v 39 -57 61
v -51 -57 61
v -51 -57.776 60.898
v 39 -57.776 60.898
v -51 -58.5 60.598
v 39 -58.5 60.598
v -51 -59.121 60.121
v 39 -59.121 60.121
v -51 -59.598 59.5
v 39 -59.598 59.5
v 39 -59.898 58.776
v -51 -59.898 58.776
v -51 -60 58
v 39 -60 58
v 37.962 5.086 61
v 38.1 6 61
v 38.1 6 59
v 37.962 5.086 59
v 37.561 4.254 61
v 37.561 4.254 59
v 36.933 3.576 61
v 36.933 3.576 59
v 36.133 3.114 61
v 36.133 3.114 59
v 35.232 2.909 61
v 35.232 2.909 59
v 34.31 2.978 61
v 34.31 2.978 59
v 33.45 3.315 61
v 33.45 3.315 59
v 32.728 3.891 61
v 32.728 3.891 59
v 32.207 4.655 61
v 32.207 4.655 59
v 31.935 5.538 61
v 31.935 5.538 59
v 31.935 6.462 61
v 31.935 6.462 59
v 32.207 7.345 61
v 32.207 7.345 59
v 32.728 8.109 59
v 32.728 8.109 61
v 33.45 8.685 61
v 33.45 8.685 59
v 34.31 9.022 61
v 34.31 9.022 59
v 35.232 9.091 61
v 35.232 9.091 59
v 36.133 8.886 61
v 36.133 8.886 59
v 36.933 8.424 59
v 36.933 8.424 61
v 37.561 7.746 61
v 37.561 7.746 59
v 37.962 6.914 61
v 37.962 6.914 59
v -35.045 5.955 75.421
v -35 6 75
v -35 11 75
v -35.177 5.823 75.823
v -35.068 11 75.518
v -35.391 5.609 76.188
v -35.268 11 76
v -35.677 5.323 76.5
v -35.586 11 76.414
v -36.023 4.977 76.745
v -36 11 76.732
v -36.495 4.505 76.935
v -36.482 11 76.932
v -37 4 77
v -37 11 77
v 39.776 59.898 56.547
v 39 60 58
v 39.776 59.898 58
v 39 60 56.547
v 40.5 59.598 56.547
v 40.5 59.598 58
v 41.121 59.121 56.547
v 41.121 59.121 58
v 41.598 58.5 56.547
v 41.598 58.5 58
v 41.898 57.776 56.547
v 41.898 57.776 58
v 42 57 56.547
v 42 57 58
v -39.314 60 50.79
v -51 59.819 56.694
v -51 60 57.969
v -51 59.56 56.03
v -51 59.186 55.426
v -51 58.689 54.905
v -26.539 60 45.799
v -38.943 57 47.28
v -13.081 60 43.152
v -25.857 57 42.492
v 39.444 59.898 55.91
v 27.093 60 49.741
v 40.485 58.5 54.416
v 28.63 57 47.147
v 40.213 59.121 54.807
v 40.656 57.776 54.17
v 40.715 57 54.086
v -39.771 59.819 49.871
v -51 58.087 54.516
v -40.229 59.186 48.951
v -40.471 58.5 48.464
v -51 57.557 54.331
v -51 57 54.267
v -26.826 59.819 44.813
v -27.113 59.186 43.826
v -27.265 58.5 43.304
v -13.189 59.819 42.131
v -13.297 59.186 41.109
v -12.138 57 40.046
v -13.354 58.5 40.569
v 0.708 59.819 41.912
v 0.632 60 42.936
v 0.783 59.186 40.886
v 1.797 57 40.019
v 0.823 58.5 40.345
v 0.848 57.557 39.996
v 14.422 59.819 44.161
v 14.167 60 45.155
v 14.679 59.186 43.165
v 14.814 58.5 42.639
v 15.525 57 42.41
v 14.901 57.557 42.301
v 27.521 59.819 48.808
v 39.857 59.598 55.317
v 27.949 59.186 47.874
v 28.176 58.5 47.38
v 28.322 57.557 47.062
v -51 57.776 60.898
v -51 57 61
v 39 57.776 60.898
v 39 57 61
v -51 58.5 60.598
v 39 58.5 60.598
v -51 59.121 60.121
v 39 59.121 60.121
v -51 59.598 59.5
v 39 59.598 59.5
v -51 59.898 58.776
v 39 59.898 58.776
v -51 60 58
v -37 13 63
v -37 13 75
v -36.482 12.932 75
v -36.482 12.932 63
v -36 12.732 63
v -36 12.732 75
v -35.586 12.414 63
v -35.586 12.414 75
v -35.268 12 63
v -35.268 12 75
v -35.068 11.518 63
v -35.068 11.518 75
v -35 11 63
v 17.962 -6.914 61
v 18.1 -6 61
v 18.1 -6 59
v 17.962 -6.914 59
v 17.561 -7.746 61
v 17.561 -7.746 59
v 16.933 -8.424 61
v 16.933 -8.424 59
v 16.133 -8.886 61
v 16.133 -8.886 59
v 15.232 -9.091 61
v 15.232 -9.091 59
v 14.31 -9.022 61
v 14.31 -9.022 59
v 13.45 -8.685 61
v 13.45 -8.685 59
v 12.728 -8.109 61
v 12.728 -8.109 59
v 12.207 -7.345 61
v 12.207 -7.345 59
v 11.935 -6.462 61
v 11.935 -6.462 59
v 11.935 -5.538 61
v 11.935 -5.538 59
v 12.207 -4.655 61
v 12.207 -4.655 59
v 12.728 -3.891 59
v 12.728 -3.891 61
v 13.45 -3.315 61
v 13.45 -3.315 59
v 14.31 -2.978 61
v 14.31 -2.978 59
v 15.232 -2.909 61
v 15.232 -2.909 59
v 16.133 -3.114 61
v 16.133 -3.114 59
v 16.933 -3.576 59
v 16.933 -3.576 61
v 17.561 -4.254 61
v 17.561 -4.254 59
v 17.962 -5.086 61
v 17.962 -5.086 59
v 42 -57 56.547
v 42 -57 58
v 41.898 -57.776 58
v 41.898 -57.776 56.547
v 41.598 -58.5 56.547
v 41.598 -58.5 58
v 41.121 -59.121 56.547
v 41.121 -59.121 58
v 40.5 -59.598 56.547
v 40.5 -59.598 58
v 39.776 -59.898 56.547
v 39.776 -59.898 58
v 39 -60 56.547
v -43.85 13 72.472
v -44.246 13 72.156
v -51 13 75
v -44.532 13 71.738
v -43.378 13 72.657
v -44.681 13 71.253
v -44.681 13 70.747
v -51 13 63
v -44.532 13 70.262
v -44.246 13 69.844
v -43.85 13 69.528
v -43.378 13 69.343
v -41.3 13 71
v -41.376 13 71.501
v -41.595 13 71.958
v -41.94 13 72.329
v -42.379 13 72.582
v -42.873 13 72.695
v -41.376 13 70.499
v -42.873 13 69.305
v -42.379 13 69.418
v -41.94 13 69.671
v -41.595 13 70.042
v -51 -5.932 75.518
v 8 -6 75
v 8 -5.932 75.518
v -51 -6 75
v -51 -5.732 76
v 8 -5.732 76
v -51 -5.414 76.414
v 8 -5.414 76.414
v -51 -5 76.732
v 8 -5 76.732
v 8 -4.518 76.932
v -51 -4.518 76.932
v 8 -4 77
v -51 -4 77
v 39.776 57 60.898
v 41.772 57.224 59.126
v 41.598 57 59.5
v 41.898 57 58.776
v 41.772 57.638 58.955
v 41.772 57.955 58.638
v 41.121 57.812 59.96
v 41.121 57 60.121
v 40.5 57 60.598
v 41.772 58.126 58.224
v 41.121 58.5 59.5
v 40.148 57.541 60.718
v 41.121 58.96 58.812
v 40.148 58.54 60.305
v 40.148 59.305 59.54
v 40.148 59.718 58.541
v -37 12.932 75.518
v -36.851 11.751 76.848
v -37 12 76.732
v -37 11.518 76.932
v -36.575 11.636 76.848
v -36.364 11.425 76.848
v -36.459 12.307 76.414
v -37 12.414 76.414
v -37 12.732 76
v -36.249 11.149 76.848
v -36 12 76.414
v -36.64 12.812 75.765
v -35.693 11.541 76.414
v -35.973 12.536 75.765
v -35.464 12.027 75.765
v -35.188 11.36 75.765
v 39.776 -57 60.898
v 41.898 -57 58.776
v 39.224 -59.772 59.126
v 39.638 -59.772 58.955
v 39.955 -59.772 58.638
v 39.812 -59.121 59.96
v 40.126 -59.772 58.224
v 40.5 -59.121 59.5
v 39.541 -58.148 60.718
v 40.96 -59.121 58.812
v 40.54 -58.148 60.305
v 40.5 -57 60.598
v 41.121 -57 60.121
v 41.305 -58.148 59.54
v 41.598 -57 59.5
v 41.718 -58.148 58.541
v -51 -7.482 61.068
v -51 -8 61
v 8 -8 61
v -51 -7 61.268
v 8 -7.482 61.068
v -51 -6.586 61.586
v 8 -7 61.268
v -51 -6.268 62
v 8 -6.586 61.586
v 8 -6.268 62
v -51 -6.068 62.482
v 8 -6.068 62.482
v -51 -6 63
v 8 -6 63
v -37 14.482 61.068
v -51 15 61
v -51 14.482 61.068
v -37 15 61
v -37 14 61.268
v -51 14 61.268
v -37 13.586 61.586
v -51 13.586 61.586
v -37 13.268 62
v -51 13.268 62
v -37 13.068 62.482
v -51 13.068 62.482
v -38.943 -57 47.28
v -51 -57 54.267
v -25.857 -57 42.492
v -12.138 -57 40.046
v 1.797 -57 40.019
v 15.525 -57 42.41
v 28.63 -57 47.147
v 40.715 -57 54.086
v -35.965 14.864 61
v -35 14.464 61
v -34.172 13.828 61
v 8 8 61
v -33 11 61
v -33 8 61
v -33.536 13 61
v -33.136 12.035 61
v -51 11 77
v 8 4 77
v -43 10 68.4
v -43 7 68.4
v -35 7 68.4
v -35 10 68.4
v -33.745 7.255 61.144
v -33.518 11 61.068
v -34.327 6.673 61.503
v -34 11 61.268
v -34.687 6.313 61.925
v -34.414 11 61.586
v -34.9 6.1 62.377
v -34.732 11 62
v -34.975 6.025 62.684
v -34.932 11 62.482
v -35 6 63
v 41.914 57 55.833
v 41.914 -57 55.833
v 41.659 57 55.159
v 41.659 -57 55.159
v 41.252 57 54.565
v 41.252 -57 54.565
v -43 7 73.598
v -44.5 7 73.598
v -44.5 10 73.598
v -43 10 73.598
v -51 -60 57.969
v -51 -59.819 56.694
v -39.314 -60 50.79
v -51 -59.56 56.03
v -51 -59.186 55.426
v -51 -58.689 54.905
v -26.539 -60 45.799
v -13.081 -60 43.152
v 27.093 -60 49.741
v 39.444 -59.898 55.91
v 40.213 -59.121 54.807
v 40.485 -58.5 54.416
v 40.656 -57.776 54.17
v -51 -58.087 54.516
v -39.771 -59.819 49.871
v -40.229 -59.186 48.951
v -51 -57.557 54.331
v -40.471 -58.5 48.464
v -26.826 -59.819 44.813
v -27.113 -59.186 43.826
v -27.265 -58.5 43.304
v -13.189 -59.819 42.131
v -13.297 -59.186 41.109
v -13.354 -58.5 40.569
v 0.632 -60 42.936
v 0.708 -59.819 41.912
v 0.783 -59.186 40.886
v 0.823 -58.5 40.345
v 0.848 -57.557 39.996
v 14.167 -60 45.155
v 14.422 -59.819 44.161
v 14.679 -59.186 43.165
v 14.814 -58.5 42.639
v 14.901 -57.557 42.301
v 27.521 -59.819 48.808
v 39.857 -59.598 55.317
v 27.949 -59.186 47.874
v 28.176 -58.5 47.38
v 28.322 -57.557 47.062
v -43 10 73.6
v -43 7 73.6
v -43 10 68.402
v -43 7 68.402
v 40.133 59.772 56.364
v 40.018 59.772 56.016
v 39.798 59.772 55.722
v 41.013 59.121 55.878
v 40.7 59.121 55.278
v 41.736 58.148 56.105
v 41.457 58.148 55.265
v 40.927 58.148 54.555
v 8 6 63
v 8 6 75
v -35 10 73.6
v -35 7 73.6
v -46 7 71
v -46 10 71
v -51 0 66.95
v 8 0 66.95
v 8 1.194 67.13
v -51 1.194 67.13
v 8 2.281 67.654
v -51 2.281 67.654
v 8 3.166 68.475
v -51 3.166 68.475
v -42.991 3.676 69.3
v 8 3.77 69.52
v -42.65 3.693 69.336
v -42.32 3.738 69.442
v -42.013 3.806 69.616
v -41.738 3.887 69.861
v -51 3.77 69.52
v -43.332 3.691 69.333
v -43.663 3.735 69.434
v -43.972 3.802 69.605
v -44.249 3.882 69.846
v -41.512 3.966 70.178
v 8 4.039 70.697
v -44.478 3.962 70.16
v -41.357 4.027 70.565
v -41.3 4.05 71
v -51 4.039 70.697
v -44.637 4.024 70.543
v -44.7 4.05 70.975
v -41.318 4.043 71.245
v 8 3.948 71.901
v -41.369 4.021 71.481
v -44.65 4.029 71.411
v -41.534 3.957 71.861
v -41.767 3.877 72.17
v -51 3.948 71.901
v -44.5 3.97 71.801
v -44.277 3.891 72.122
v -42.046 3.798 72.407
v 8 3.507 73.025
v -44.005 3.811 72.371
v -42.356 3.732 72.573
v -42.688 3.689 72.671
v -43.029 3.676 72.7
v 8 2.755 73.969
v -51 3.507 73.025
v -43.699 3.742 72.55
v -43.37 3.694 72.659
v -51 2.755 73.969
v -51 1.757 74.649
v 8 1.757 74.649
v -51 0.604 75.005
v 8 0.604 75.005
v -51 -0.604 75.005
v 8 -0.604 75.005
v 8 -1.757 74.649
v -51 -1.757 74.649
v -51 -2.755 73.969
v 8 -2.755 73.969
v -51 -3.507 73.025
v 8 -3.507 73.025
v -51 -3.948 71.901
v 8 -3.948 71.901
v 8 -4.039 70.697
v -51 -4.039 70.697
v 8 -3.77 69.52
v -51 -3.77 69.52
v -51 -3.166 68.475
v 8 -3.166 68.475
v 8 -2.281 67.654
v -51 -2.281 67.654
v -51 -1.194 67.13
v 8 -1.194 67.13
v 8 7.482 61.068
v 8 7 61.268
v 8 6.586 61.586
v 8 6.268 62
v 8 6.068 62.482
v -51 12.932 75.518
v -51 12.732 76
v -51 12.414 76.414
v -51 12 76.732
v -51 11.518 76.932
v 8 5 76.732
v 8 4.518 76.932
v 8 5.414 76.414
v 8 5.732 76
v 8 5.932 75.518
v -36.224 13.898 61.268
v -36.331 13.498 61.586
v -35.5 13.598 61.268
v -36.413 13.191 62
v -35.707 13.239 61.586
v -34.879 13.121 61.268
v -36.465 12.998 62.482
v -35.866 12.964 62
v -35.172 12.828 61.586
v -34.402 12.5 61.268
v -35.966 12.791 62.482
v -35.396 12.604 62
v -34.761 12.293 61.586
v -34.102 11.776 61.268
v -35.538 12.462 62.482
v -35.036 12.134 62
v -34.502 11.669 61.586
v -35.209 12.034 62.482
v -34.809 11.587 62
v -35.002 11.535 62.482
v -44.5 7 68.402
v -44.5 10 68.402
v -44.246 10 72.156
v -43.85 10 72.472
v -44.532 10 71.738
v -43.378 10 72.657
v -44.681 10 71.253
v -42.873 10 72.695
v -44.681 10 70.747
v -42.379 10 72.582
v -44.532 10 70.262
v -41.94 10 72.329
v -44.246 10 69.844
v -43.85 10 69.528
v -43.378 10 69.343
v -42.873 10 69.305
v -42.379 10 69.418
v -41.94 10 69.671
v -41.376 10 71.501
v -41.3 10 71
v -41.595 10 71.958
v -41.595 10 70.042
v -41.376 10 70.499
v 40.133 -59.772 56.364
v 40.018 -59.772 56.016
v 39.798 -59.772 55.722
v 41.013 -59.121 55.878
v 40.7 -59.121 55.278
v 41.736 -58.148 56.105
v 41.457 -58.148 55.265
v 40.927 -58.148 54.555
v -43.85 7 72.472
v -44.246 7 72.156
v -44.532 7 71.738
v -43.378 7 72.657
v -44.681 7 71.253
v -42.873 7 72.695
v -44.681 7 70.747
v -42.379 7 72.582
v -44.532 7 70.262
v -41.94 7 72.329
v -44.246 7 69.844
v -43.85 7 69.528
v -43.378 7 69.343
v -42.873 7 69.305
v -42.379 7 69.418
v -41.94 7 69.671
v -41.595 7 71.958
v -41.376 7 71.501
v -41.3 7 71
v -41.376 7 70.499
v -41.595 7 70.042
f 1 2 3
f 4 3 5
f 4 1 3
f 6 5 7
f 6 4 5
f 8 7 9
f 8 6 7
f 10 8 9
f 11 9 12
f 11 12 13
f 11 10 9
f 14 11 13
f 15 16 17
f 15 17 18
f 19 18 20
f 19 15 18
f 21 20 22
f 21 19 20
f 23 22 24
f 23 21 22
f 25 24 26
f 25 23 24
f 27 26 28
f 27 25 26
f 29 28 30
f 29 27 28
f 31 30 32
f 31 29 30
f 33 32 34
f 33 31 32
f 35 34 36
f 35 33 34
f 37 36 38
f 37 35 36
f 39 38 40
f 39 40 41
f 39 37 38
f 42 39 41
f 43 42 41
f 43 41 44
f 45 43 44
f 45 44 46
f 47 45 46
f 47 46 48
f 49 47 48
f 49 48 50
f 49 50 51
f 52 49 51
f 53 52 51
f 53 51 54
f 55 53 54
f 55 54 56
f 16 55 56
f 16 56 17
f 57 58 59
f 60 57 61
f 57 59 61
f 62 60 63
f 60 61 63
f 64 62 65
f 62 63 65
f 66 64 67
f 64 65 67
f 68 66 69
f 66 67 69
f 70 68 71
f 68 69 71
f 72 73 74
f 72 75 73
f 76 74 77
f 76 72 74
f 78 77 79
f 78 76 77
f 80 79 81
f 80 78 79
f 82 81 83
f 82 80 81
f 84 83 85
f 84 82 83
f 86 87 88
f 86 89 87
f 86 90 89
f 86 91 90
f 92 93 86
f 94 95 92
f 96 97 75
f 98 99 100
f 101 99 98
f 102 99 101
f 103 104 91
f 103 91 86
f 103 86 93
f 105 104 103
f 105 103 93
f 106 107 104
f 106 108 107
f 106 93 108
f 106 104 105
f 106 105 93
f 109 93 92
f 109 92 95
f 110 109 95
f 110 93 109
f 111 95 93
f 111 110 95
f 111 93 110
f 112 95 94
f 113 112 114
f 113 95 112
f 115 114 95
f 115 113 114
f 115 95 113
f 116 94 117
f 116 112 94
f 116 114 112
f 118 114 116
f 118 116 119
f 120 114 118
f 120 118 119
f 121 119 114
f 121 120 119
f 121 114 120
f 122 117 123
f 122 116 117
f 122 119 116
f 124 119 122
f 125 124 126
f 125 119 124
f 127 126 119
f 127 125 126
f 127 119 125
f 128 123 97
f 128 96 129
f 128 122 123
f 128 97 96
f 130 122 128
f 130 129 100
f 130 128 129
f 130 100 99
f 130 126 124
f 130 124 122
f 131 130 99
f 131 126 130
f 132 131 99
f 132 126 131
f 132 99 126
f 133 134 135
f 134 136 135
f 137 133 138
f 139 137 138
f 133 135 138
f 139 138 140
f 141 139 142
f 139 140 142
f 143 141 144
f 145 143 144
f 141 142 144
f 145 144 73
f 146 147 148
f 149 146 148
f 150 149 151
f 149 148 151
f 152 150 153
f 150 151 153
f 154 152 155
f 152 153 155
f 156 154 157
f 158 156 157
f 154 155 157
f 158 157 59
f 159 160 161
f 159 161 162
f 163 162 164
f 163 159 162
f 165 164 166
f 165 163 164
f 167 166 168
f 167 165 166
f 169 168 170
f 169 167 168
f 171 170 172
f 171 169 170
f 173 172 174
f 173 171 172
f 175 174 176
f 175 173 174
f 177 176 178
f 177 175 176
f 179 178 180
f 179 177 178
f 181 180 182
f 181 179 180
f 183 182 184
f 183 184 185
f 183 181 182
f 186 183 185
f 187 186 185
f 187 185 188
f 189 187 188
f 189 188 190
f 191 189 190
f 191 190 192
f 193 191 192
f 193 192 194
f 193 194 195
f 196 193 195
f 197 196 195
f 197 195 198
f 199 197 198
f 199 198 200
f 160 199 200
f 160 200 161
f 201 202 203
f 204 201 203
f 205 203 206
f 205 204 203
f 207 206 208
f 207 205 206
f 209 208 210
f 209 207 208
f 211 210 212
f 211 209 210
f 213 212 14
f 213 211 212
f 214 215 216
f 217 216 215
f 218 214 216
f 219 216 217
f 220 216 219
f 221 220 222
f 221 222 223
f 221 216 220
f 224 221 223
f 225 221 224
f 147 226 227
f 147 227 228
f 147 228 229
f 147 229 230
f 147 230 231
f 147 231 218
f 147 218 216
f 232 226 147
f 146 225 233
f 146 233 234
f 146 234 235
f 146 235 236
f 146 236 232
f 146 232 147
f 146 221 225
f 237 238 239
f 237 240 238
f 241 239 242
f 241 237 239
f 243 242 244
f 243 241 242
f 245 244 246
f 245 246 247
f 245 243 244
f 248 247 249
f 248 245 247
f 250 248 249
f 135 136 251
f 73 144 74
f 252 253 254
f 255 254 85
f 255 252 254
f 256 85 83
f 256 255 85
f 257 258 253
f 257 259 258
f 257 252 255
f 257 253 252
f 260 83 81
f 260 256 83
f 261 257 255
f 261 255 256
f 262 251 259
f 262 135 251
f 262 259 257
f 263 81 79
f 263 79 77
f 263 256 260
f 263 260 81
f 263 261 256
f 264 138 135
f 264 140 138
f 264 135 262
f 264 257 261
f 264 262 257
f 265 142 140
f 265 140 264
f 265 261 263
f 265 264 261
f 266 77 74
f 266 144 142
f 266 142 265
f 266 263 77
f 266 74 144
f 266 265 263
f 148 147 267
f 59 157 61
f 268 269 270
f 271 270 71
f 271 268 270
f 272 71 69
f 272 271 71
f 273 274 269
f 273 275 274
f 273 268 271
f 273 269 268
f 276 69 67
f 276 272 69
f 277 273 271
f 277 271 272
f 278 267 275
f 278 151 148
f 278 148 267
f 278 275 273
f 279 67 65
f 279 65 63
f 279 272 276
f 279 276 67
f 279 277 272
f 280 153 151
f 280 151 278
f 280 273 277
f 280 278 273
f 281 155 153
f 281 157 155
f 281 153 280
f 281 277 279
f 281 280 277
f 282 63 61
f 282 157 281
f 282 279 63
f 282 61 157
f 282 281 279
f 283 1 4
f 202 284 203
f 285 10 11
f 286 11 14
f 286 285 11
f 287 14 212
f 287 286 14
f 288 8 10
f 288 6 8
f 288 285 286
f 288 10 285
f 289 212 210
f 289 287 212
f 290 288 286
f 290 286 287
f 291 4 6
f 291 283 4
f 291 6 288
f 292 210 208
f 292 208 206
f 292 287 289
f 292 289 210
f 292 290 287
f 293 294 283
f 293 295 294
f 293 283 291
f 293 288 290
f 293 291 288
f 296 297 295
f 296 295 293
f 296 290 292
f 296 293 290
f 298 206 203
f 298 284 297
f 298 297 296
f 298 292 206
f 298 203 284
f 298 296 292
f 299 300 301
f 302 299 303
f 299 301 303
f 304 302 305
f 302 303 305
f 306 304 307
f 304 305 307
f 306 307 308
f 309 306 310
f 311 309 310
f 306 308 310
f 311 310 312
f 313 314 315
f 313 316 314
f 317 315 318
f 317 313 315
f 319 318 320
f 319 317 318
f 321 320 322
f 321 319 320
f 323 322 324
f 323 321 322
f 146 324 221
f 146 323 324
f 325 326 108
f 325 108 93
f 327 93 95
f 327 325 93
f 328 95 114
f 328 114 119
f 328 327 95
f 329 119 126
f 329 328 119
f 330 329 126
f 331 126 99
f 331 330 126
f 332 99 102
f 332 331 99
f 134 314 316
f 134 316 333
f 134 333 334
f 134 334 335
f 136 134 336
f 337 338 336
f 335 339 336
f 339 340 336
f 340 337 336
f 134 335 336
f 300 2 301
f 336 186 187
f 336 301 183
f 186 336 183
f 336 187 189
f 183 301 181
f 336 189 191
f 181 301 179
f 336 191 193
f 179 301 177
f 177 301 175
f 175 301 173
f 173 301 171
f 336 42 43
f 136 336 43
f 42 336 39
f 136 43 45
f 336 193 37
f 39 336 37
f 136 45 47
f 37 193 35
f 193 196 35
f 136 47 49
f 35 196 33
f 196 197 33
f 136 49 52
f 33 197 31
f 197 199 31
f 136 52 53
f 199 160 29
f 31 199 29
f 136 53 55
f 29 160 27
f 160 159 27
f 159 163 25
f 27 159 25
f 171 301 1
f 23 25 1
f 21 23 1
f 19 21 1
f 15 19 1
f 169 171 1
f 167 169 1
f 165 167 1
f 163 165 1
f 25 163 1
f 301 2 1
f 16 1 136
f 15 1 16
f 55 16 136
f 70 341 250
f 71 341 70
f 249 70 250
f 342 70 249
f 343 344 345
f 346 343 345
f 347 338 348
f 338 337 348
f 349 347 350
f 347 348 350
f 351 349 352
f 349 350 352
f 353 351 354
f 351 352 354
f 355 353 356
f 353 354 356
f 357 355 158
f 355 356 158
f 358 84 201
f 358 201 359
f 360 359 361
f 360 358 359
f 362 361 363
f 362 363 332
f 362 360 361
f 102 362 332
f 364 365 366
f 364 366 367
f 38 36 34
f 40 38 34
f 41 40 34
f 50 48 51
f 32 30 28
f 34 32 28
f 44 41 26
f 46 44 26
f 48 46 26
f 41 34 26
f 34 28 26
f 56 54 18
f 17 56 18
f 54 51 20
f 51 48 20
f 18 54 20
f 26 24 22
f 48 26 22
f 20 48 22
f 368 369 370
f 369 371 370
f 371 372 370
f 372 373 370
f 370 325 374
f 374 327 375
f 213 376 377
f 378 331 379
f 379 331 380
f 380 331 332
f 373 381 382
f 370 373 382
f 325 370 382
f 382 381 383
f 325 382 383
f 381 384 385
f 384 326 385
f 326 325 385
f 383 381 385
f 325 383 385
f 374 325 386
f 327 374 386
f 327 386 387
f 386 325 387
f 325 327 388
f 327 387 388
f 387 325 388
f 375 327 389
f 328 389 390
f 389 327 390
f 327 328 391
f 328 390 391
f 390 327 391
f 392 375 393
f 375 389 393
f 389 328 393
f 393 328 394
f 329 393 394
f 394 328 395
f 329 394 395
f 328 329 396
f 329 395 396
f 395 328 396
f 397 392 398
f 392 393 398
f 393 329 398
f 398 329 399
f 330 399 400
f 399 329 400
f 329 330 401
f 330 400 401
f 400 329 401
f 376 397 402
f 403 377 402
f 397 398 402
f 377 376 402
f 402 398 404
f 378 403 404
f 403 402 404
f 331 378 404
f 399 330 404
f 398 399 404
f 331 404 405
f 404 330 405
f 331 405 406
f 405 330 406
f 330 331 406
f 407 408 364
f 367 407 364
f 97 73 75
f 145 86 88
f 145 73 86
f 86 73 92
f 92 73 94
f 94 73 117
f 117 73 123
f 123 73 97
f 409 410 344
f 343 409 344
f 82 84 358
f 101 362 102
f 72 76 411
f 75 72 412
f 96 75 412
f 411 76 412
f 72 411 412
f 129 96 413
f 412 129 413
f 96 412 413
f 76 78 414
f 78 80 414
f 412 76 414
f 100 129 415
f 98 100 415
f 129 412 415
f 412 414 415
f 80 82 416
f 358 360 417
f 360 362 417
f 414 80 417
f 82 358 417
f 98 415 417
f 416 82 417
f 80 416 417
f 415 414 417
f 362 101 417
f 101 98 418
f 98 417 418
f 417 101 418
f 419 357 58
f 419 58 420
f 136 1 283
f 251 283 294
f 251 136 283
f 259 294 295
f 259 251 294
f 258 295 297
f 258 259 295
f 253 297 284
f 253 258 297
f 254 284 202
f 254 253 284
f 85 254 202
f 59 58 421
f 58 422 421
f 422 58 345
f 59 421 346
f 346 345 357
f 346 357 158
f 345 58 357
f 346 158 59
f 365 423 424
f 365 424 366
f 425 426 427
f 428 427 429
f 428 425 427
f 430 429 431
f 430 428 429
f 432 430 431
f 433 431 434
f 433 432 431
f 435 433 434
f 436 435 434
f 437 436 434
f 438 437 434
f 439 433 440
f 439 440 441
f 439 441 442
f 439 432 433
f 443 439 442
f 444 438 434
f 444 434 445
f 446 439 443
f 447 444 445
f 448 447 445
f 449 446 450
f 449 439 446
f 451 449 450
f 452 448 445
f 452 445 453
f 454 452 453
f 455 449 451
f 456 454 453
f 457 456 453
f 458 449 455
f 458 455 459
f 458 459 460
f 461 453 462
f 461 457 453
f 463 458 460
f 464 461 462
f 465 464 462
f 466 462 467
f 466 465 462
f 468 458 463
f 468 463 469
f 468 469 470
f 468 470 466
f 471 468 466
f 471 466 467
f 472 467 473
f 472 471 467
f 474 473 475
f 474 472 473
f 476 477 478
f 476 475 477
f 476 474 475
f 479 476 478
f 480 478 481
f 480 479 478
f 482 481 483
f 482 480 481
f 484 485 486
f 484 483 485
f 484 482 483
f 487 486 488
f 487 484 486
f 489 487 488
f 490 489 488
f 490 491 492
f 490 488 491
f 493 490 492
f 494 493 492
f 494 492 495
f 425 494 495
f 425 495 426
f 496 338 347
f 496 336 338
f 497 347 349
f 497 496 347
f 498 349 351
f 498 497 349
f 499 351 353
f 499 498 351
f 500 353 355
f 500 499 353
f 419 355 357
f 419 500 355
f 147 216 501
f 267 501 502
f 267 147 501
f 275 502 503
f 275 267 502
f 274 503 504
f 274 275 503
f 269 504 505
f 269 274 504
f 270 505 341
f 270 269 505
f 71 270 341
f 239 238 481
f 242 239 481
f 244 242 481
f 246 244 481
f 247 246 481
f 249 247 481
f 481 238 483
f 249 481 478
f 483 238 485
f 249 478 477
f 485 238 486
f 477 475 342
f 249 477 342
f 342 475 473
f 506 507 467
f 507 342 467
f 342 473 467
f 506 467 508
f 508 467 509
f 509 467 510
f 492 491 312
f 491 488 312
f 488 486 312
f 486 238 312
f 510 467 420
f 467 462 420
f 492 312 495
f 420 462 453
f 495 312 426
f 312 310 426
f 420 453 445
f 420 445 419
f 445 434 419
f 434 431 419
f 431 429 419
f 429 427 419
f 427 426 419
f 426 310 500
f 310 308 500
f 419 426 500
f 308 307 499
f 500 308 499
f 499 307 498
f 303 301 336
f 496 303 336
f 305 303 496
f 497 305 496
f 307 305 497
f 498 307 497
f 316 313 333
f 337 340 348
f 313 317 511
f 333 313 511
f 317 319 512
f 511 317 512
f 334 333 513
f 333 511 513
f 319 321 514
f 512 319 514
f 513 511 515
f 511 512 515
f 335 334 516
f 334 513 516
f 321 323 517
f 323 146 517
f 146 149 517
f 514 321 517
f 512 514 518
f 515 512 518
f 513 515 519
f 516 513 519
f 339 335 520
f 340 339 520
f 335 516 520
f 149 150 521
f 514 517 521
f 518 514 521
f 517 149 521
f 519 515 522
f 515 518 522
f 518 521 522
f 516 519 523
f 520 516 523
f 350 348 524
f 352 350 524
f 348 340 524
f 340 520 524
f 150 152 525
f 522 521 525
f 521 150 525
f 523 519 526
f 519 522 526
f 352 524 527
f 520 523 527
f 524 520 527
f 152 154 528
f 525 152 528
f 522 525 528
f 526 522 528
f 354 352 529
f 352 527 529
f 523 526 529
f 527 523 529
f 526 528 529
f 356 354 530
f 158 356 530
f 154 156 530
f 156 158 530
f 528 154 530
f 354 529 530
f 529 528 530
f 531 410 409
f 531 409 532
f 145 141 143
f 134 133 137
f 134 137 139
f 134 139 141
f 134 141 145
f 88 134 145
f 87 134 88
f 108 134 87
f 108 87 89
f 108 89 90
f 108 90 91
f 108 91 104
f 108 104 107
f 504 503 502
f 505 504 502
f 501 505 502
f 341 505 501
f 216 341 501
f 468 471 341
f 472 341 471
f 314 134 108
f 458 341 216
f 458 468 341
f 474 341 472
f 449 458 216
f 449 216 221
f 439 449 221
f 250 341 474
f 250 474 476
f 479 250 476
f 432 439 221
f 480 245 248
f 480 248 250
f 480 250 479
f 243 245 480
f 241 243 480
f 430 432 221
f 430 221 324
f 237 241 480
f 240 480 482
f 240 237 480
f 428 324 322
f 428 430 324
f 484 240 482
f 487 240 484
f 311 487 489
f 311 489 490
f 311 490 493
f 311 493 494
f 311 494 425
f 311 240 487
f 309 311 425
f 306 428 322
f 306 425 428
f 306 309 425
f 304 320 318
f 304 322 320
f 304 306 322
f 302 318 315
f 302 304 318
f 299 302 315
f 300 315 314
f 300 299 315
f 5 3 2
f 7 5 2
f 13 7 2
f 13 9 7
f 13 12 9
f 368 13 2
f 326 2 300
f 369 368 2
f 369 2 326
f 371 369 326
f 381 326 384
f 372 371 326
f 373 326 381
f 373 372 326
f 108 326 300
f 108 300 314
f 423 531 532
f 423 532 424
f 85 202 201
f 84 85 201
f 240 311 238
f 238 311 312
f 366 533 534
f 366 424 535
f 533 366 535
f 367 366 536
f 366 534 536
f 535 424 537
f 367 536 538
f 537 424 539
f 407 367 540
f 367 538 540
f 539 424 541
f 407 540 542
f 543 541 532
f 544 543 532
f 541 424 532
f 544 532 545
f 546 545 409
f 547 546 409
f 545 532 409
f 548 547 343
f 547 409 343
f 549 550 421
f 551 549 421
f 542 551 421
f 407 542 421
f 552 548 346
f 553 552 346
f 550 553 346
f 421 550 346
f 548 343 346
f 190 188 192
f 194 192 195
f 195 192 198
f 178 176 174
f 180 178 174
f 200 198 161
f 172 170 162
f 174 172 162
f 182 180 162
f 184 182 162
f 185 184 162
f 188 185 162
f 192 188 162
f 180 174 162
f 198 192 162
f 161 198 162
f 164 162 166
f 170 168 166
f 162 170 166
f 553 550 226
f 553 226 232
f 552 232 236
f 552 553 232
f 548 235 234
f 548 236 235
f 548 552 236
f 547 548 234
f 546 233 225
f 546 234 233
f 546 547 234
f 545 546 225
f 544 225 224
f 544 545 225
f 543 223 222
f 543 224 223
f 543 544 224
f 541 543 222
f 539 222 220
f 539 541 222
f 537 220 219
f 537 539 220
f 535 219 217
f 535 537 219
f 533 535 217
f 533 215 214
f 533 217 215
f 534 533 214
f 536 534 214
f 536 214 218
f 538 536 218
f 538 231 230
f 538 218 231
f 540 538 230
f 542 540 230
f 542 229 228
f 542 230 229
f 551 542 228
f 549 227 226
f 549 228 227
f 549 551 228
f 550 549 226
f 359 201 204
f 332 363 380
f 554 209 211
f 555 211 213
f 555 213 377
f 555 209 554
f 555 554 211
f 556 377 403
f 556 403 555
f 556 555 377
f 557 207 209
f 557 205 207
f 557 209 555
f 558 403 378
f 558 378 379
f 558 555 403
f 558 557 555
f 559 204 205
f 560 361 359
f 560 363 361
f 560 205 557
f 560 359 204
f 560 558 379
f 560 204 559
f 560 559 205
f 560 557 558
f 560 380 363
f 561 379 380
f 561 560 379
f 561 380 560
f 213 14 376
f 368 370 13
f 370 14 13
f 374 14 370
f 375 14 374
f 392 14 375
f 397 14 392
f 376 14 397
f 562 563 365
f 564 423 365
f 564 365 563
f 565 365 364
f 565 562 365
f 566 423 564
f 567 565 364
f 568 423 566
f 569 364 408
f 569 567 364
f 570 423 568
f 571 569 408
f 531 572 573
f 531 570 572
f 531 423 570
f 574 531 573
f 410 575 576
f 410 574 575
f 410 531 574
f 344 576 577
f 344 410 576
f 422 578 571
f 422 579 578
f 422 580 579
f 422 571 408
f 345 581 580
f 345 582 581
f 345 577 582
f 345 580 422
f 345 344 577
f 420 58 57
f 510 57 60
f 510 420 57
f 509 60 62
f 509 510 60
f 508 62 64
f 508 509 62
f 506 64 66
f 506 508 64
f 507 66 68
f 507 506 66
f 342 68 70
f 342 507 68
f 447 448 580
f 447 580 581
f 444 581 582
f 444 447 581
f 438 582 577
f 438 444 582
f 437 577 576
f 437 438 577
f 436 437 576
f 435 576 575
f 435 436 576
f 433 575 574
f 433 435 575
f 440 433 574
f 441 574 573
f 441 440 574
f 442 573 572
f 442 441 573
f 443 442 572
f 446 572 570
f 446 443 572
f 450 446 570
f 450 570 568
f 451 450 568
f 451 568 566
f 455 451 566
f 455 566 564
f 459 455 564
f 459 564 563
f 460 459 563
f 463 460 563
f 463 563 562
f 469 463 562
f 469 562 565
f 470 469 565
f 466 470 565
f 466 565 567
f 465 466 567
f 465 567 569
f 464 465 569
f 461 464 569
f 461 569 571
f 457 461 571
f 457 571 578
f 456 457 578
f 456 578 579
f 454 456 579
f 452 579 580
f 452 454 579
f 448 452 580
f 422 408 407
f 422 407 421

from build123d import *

# Parameters (mm, degrees)
CYLINDER020_R             = 3.1
CYLINDER020_DEPTH         = 3
CYLINDER021_R             = 3.1
CYLINDER021_DEPTH         = 3
CYLINDER022_R             = 1.7
CYLINDER022_DEPTH         = 21
BOX003_W                  = 23
BOX003_H                  = 5.2
BOX003_DEPTH              = 3
PRISM_DEPTH               = 3
FUSION006_PLACEMENT_ANGLE = 90
CYLINDER006_R             = 4.05
CYLINDER006_DEPTH         = 270
EXTRUDE_DEPTH             = 60
BOX002_W                  = 43
BOX002_H                  = 12
BOX002_DEPTH              = 16
BOX_W                     = 16
BOX_H                     = 19
BOX_DEPTH                 = 16
FILLET_R                  = 3
FILLET001_R               = 2


with BuildPart() as cilindro020:
    # Cylinder020 → Cylinder020 (new body)
    with BuildSketch(Plane(origin=(35, 6, 62), x_dir=(1, 0, 0), z_dir=(0, 0, -1))):
        Circle(CYLINDER020_R)
    extrude(amount=CYLINDER020_DEPTH)


with BuildPart() as cilindro021:
    # Cylinder021 → Cylinder021 (new body)
    with BuildSketch(Plane(origin=(15, -6, 62), x_dir=(1, 0, 0), z_dir=(0, 0, -1))):
        Circle(CYLINDER021_R)
    extrude(amount=CYLINDER021_DEPTH)


with BuildPart() as cilindro022:
    # Cylinder022 → Cylinder022 (new body)
    with BuildSketch(Plane.XY.offset(-6)):
        Circle(CYLINDER022_R)
    extrude(amount=CYLINDER022_DEPTH)


with BuildPart() as cubo003:
    # Box003 → Box003 (new body)
    with BuildSketch(Plane(origin=(0, -2.6, 0), x_dir=(1, 0, 0), z_dir=(0, 0, 1))):
        with Locations((11.5, 2.6)):
            Rectangle(BOX003_W, BOX003_H)
    extrude(amount=BOX003_DEPTH)


with BuildPart() as hueco_tornillo:
    # Prism → Prism (new body)
    with BuildSketch(Plane.XY):
        Polygon((3, 0), (1.5, 2.598076), (-1.5, 2.598076), (-3, 0), (-1.5, -2.598076), (1.5, -2.598076), align=None)
    extrude(amount=PRISM_DEPTH)

    # Fusion006: union Cilindro022, Cubo003
    add(cilindro022.part)
    add(cubo003.part)


with BuildPart() as hueco_tornillo_1:
    # Fusion006 placement: moved
    add(hueco_tornillo.part.moved(Location((-43, 7, 71))).rotate(Axis((-43, 7, 71), (-1, 0, 0)), FUSION006_PLACEMENT_ANGLE))


with BuildPart() as fusion005:
    # Cylinder006 → Cylinder006 (new body)
    with BuildSketch(Plane(origin=(-51, 0, 71), x_dir=(0, 0, -1), z_dir=(1, 0, 0))):
        Circle(CYLINDER006_R)
    extrude(amount=CYLINDER006_DEPTH)

    # Fusion005: union Cilindro020, Cilindro021, hueco_tornillo
    add(cilindro020.part)
    add(cilindro021.part)
    add(hueco_tornillo_1.part)


with BuildPart() as extrude_body:
    # Sketch → Extrude (new body, symmetric)
    with BuildSketch(Plane.XZ):
        with BuildLine():
            Line((-51, 61), (42, 61))
            Line((42, 61), (42, 55))
            ThreePointArc((-51, 54.267), (-4.382542, 39.730934), (42, 55))
            Line((-51, 61), (-51, 54.267))
        make_face()
    extrude(amount=EXTRUDE_DEPTH, both=True)


with BuildPart() as cubo002:
    # Box002 → Box002 (new body)
    with BuildSketch(Plane(origin=(-35, -6, 61), x_dir=(1, 0, 0), z_dir=(0, 0, 1))):
        with Locations((21.5, 6)):
            Rectangle(BOX002_W, BOX002_H)
    extrude(amount=BOX002_DEPTH)


with BuildPart() as fillet001:
    # Box → Box (new body)
    with BuildSketch(Plane(origin=(-51, -6, 61), x_dir=(1, 0, 0), z_dir=(0, 0, 1))):
        with Locations((8, 9.5)):
            Rectangle(BOX_W, BOX_H)
    extrude(amount=BOX_DEPTH)

    # Fusion002: union Extrude body, Cubo002
    add(extrude_body.part)
    add(cubo002.part)

    # Cut006: cut Fusion005
    add(fusion005.part, mode=Mode.SUBTRACT)

    # Fillet
    fillet_edges = [fillet001.edges().sort_by_distance(p)[0] for p in [
        (-4.5, 60, 61),
        (42, 0, 61),
        (-4.5, -60, 61),
        (42, 60, 58),
        (-4.382542, 60, 39.730934),
        (42, 0, 55),
        (42, -60, 58),
        (-4.382542, -60, 39.730934),
    ]]
    fillet(fillet_edges, radius=FILLET_R)

    # Fillet001
    fillet001_edges = [fillet001.edges().sort_by_distance(p)[0] for p in [
        (-43, 13, 61),
        (-35, 9.5, 61),
        (-13.5, 6, 61),
        (-21.5, -6, 61),
        (-35, 13, 69),
        (-43, 13, 77),
        (-35, 9.5, 77),
        (-13.5, 6, 77),
        (-21.5, -6, 77),
    ]]
    fillet(fillet001_edges, radius=FILLET001_R)


solid = fillet001.part
